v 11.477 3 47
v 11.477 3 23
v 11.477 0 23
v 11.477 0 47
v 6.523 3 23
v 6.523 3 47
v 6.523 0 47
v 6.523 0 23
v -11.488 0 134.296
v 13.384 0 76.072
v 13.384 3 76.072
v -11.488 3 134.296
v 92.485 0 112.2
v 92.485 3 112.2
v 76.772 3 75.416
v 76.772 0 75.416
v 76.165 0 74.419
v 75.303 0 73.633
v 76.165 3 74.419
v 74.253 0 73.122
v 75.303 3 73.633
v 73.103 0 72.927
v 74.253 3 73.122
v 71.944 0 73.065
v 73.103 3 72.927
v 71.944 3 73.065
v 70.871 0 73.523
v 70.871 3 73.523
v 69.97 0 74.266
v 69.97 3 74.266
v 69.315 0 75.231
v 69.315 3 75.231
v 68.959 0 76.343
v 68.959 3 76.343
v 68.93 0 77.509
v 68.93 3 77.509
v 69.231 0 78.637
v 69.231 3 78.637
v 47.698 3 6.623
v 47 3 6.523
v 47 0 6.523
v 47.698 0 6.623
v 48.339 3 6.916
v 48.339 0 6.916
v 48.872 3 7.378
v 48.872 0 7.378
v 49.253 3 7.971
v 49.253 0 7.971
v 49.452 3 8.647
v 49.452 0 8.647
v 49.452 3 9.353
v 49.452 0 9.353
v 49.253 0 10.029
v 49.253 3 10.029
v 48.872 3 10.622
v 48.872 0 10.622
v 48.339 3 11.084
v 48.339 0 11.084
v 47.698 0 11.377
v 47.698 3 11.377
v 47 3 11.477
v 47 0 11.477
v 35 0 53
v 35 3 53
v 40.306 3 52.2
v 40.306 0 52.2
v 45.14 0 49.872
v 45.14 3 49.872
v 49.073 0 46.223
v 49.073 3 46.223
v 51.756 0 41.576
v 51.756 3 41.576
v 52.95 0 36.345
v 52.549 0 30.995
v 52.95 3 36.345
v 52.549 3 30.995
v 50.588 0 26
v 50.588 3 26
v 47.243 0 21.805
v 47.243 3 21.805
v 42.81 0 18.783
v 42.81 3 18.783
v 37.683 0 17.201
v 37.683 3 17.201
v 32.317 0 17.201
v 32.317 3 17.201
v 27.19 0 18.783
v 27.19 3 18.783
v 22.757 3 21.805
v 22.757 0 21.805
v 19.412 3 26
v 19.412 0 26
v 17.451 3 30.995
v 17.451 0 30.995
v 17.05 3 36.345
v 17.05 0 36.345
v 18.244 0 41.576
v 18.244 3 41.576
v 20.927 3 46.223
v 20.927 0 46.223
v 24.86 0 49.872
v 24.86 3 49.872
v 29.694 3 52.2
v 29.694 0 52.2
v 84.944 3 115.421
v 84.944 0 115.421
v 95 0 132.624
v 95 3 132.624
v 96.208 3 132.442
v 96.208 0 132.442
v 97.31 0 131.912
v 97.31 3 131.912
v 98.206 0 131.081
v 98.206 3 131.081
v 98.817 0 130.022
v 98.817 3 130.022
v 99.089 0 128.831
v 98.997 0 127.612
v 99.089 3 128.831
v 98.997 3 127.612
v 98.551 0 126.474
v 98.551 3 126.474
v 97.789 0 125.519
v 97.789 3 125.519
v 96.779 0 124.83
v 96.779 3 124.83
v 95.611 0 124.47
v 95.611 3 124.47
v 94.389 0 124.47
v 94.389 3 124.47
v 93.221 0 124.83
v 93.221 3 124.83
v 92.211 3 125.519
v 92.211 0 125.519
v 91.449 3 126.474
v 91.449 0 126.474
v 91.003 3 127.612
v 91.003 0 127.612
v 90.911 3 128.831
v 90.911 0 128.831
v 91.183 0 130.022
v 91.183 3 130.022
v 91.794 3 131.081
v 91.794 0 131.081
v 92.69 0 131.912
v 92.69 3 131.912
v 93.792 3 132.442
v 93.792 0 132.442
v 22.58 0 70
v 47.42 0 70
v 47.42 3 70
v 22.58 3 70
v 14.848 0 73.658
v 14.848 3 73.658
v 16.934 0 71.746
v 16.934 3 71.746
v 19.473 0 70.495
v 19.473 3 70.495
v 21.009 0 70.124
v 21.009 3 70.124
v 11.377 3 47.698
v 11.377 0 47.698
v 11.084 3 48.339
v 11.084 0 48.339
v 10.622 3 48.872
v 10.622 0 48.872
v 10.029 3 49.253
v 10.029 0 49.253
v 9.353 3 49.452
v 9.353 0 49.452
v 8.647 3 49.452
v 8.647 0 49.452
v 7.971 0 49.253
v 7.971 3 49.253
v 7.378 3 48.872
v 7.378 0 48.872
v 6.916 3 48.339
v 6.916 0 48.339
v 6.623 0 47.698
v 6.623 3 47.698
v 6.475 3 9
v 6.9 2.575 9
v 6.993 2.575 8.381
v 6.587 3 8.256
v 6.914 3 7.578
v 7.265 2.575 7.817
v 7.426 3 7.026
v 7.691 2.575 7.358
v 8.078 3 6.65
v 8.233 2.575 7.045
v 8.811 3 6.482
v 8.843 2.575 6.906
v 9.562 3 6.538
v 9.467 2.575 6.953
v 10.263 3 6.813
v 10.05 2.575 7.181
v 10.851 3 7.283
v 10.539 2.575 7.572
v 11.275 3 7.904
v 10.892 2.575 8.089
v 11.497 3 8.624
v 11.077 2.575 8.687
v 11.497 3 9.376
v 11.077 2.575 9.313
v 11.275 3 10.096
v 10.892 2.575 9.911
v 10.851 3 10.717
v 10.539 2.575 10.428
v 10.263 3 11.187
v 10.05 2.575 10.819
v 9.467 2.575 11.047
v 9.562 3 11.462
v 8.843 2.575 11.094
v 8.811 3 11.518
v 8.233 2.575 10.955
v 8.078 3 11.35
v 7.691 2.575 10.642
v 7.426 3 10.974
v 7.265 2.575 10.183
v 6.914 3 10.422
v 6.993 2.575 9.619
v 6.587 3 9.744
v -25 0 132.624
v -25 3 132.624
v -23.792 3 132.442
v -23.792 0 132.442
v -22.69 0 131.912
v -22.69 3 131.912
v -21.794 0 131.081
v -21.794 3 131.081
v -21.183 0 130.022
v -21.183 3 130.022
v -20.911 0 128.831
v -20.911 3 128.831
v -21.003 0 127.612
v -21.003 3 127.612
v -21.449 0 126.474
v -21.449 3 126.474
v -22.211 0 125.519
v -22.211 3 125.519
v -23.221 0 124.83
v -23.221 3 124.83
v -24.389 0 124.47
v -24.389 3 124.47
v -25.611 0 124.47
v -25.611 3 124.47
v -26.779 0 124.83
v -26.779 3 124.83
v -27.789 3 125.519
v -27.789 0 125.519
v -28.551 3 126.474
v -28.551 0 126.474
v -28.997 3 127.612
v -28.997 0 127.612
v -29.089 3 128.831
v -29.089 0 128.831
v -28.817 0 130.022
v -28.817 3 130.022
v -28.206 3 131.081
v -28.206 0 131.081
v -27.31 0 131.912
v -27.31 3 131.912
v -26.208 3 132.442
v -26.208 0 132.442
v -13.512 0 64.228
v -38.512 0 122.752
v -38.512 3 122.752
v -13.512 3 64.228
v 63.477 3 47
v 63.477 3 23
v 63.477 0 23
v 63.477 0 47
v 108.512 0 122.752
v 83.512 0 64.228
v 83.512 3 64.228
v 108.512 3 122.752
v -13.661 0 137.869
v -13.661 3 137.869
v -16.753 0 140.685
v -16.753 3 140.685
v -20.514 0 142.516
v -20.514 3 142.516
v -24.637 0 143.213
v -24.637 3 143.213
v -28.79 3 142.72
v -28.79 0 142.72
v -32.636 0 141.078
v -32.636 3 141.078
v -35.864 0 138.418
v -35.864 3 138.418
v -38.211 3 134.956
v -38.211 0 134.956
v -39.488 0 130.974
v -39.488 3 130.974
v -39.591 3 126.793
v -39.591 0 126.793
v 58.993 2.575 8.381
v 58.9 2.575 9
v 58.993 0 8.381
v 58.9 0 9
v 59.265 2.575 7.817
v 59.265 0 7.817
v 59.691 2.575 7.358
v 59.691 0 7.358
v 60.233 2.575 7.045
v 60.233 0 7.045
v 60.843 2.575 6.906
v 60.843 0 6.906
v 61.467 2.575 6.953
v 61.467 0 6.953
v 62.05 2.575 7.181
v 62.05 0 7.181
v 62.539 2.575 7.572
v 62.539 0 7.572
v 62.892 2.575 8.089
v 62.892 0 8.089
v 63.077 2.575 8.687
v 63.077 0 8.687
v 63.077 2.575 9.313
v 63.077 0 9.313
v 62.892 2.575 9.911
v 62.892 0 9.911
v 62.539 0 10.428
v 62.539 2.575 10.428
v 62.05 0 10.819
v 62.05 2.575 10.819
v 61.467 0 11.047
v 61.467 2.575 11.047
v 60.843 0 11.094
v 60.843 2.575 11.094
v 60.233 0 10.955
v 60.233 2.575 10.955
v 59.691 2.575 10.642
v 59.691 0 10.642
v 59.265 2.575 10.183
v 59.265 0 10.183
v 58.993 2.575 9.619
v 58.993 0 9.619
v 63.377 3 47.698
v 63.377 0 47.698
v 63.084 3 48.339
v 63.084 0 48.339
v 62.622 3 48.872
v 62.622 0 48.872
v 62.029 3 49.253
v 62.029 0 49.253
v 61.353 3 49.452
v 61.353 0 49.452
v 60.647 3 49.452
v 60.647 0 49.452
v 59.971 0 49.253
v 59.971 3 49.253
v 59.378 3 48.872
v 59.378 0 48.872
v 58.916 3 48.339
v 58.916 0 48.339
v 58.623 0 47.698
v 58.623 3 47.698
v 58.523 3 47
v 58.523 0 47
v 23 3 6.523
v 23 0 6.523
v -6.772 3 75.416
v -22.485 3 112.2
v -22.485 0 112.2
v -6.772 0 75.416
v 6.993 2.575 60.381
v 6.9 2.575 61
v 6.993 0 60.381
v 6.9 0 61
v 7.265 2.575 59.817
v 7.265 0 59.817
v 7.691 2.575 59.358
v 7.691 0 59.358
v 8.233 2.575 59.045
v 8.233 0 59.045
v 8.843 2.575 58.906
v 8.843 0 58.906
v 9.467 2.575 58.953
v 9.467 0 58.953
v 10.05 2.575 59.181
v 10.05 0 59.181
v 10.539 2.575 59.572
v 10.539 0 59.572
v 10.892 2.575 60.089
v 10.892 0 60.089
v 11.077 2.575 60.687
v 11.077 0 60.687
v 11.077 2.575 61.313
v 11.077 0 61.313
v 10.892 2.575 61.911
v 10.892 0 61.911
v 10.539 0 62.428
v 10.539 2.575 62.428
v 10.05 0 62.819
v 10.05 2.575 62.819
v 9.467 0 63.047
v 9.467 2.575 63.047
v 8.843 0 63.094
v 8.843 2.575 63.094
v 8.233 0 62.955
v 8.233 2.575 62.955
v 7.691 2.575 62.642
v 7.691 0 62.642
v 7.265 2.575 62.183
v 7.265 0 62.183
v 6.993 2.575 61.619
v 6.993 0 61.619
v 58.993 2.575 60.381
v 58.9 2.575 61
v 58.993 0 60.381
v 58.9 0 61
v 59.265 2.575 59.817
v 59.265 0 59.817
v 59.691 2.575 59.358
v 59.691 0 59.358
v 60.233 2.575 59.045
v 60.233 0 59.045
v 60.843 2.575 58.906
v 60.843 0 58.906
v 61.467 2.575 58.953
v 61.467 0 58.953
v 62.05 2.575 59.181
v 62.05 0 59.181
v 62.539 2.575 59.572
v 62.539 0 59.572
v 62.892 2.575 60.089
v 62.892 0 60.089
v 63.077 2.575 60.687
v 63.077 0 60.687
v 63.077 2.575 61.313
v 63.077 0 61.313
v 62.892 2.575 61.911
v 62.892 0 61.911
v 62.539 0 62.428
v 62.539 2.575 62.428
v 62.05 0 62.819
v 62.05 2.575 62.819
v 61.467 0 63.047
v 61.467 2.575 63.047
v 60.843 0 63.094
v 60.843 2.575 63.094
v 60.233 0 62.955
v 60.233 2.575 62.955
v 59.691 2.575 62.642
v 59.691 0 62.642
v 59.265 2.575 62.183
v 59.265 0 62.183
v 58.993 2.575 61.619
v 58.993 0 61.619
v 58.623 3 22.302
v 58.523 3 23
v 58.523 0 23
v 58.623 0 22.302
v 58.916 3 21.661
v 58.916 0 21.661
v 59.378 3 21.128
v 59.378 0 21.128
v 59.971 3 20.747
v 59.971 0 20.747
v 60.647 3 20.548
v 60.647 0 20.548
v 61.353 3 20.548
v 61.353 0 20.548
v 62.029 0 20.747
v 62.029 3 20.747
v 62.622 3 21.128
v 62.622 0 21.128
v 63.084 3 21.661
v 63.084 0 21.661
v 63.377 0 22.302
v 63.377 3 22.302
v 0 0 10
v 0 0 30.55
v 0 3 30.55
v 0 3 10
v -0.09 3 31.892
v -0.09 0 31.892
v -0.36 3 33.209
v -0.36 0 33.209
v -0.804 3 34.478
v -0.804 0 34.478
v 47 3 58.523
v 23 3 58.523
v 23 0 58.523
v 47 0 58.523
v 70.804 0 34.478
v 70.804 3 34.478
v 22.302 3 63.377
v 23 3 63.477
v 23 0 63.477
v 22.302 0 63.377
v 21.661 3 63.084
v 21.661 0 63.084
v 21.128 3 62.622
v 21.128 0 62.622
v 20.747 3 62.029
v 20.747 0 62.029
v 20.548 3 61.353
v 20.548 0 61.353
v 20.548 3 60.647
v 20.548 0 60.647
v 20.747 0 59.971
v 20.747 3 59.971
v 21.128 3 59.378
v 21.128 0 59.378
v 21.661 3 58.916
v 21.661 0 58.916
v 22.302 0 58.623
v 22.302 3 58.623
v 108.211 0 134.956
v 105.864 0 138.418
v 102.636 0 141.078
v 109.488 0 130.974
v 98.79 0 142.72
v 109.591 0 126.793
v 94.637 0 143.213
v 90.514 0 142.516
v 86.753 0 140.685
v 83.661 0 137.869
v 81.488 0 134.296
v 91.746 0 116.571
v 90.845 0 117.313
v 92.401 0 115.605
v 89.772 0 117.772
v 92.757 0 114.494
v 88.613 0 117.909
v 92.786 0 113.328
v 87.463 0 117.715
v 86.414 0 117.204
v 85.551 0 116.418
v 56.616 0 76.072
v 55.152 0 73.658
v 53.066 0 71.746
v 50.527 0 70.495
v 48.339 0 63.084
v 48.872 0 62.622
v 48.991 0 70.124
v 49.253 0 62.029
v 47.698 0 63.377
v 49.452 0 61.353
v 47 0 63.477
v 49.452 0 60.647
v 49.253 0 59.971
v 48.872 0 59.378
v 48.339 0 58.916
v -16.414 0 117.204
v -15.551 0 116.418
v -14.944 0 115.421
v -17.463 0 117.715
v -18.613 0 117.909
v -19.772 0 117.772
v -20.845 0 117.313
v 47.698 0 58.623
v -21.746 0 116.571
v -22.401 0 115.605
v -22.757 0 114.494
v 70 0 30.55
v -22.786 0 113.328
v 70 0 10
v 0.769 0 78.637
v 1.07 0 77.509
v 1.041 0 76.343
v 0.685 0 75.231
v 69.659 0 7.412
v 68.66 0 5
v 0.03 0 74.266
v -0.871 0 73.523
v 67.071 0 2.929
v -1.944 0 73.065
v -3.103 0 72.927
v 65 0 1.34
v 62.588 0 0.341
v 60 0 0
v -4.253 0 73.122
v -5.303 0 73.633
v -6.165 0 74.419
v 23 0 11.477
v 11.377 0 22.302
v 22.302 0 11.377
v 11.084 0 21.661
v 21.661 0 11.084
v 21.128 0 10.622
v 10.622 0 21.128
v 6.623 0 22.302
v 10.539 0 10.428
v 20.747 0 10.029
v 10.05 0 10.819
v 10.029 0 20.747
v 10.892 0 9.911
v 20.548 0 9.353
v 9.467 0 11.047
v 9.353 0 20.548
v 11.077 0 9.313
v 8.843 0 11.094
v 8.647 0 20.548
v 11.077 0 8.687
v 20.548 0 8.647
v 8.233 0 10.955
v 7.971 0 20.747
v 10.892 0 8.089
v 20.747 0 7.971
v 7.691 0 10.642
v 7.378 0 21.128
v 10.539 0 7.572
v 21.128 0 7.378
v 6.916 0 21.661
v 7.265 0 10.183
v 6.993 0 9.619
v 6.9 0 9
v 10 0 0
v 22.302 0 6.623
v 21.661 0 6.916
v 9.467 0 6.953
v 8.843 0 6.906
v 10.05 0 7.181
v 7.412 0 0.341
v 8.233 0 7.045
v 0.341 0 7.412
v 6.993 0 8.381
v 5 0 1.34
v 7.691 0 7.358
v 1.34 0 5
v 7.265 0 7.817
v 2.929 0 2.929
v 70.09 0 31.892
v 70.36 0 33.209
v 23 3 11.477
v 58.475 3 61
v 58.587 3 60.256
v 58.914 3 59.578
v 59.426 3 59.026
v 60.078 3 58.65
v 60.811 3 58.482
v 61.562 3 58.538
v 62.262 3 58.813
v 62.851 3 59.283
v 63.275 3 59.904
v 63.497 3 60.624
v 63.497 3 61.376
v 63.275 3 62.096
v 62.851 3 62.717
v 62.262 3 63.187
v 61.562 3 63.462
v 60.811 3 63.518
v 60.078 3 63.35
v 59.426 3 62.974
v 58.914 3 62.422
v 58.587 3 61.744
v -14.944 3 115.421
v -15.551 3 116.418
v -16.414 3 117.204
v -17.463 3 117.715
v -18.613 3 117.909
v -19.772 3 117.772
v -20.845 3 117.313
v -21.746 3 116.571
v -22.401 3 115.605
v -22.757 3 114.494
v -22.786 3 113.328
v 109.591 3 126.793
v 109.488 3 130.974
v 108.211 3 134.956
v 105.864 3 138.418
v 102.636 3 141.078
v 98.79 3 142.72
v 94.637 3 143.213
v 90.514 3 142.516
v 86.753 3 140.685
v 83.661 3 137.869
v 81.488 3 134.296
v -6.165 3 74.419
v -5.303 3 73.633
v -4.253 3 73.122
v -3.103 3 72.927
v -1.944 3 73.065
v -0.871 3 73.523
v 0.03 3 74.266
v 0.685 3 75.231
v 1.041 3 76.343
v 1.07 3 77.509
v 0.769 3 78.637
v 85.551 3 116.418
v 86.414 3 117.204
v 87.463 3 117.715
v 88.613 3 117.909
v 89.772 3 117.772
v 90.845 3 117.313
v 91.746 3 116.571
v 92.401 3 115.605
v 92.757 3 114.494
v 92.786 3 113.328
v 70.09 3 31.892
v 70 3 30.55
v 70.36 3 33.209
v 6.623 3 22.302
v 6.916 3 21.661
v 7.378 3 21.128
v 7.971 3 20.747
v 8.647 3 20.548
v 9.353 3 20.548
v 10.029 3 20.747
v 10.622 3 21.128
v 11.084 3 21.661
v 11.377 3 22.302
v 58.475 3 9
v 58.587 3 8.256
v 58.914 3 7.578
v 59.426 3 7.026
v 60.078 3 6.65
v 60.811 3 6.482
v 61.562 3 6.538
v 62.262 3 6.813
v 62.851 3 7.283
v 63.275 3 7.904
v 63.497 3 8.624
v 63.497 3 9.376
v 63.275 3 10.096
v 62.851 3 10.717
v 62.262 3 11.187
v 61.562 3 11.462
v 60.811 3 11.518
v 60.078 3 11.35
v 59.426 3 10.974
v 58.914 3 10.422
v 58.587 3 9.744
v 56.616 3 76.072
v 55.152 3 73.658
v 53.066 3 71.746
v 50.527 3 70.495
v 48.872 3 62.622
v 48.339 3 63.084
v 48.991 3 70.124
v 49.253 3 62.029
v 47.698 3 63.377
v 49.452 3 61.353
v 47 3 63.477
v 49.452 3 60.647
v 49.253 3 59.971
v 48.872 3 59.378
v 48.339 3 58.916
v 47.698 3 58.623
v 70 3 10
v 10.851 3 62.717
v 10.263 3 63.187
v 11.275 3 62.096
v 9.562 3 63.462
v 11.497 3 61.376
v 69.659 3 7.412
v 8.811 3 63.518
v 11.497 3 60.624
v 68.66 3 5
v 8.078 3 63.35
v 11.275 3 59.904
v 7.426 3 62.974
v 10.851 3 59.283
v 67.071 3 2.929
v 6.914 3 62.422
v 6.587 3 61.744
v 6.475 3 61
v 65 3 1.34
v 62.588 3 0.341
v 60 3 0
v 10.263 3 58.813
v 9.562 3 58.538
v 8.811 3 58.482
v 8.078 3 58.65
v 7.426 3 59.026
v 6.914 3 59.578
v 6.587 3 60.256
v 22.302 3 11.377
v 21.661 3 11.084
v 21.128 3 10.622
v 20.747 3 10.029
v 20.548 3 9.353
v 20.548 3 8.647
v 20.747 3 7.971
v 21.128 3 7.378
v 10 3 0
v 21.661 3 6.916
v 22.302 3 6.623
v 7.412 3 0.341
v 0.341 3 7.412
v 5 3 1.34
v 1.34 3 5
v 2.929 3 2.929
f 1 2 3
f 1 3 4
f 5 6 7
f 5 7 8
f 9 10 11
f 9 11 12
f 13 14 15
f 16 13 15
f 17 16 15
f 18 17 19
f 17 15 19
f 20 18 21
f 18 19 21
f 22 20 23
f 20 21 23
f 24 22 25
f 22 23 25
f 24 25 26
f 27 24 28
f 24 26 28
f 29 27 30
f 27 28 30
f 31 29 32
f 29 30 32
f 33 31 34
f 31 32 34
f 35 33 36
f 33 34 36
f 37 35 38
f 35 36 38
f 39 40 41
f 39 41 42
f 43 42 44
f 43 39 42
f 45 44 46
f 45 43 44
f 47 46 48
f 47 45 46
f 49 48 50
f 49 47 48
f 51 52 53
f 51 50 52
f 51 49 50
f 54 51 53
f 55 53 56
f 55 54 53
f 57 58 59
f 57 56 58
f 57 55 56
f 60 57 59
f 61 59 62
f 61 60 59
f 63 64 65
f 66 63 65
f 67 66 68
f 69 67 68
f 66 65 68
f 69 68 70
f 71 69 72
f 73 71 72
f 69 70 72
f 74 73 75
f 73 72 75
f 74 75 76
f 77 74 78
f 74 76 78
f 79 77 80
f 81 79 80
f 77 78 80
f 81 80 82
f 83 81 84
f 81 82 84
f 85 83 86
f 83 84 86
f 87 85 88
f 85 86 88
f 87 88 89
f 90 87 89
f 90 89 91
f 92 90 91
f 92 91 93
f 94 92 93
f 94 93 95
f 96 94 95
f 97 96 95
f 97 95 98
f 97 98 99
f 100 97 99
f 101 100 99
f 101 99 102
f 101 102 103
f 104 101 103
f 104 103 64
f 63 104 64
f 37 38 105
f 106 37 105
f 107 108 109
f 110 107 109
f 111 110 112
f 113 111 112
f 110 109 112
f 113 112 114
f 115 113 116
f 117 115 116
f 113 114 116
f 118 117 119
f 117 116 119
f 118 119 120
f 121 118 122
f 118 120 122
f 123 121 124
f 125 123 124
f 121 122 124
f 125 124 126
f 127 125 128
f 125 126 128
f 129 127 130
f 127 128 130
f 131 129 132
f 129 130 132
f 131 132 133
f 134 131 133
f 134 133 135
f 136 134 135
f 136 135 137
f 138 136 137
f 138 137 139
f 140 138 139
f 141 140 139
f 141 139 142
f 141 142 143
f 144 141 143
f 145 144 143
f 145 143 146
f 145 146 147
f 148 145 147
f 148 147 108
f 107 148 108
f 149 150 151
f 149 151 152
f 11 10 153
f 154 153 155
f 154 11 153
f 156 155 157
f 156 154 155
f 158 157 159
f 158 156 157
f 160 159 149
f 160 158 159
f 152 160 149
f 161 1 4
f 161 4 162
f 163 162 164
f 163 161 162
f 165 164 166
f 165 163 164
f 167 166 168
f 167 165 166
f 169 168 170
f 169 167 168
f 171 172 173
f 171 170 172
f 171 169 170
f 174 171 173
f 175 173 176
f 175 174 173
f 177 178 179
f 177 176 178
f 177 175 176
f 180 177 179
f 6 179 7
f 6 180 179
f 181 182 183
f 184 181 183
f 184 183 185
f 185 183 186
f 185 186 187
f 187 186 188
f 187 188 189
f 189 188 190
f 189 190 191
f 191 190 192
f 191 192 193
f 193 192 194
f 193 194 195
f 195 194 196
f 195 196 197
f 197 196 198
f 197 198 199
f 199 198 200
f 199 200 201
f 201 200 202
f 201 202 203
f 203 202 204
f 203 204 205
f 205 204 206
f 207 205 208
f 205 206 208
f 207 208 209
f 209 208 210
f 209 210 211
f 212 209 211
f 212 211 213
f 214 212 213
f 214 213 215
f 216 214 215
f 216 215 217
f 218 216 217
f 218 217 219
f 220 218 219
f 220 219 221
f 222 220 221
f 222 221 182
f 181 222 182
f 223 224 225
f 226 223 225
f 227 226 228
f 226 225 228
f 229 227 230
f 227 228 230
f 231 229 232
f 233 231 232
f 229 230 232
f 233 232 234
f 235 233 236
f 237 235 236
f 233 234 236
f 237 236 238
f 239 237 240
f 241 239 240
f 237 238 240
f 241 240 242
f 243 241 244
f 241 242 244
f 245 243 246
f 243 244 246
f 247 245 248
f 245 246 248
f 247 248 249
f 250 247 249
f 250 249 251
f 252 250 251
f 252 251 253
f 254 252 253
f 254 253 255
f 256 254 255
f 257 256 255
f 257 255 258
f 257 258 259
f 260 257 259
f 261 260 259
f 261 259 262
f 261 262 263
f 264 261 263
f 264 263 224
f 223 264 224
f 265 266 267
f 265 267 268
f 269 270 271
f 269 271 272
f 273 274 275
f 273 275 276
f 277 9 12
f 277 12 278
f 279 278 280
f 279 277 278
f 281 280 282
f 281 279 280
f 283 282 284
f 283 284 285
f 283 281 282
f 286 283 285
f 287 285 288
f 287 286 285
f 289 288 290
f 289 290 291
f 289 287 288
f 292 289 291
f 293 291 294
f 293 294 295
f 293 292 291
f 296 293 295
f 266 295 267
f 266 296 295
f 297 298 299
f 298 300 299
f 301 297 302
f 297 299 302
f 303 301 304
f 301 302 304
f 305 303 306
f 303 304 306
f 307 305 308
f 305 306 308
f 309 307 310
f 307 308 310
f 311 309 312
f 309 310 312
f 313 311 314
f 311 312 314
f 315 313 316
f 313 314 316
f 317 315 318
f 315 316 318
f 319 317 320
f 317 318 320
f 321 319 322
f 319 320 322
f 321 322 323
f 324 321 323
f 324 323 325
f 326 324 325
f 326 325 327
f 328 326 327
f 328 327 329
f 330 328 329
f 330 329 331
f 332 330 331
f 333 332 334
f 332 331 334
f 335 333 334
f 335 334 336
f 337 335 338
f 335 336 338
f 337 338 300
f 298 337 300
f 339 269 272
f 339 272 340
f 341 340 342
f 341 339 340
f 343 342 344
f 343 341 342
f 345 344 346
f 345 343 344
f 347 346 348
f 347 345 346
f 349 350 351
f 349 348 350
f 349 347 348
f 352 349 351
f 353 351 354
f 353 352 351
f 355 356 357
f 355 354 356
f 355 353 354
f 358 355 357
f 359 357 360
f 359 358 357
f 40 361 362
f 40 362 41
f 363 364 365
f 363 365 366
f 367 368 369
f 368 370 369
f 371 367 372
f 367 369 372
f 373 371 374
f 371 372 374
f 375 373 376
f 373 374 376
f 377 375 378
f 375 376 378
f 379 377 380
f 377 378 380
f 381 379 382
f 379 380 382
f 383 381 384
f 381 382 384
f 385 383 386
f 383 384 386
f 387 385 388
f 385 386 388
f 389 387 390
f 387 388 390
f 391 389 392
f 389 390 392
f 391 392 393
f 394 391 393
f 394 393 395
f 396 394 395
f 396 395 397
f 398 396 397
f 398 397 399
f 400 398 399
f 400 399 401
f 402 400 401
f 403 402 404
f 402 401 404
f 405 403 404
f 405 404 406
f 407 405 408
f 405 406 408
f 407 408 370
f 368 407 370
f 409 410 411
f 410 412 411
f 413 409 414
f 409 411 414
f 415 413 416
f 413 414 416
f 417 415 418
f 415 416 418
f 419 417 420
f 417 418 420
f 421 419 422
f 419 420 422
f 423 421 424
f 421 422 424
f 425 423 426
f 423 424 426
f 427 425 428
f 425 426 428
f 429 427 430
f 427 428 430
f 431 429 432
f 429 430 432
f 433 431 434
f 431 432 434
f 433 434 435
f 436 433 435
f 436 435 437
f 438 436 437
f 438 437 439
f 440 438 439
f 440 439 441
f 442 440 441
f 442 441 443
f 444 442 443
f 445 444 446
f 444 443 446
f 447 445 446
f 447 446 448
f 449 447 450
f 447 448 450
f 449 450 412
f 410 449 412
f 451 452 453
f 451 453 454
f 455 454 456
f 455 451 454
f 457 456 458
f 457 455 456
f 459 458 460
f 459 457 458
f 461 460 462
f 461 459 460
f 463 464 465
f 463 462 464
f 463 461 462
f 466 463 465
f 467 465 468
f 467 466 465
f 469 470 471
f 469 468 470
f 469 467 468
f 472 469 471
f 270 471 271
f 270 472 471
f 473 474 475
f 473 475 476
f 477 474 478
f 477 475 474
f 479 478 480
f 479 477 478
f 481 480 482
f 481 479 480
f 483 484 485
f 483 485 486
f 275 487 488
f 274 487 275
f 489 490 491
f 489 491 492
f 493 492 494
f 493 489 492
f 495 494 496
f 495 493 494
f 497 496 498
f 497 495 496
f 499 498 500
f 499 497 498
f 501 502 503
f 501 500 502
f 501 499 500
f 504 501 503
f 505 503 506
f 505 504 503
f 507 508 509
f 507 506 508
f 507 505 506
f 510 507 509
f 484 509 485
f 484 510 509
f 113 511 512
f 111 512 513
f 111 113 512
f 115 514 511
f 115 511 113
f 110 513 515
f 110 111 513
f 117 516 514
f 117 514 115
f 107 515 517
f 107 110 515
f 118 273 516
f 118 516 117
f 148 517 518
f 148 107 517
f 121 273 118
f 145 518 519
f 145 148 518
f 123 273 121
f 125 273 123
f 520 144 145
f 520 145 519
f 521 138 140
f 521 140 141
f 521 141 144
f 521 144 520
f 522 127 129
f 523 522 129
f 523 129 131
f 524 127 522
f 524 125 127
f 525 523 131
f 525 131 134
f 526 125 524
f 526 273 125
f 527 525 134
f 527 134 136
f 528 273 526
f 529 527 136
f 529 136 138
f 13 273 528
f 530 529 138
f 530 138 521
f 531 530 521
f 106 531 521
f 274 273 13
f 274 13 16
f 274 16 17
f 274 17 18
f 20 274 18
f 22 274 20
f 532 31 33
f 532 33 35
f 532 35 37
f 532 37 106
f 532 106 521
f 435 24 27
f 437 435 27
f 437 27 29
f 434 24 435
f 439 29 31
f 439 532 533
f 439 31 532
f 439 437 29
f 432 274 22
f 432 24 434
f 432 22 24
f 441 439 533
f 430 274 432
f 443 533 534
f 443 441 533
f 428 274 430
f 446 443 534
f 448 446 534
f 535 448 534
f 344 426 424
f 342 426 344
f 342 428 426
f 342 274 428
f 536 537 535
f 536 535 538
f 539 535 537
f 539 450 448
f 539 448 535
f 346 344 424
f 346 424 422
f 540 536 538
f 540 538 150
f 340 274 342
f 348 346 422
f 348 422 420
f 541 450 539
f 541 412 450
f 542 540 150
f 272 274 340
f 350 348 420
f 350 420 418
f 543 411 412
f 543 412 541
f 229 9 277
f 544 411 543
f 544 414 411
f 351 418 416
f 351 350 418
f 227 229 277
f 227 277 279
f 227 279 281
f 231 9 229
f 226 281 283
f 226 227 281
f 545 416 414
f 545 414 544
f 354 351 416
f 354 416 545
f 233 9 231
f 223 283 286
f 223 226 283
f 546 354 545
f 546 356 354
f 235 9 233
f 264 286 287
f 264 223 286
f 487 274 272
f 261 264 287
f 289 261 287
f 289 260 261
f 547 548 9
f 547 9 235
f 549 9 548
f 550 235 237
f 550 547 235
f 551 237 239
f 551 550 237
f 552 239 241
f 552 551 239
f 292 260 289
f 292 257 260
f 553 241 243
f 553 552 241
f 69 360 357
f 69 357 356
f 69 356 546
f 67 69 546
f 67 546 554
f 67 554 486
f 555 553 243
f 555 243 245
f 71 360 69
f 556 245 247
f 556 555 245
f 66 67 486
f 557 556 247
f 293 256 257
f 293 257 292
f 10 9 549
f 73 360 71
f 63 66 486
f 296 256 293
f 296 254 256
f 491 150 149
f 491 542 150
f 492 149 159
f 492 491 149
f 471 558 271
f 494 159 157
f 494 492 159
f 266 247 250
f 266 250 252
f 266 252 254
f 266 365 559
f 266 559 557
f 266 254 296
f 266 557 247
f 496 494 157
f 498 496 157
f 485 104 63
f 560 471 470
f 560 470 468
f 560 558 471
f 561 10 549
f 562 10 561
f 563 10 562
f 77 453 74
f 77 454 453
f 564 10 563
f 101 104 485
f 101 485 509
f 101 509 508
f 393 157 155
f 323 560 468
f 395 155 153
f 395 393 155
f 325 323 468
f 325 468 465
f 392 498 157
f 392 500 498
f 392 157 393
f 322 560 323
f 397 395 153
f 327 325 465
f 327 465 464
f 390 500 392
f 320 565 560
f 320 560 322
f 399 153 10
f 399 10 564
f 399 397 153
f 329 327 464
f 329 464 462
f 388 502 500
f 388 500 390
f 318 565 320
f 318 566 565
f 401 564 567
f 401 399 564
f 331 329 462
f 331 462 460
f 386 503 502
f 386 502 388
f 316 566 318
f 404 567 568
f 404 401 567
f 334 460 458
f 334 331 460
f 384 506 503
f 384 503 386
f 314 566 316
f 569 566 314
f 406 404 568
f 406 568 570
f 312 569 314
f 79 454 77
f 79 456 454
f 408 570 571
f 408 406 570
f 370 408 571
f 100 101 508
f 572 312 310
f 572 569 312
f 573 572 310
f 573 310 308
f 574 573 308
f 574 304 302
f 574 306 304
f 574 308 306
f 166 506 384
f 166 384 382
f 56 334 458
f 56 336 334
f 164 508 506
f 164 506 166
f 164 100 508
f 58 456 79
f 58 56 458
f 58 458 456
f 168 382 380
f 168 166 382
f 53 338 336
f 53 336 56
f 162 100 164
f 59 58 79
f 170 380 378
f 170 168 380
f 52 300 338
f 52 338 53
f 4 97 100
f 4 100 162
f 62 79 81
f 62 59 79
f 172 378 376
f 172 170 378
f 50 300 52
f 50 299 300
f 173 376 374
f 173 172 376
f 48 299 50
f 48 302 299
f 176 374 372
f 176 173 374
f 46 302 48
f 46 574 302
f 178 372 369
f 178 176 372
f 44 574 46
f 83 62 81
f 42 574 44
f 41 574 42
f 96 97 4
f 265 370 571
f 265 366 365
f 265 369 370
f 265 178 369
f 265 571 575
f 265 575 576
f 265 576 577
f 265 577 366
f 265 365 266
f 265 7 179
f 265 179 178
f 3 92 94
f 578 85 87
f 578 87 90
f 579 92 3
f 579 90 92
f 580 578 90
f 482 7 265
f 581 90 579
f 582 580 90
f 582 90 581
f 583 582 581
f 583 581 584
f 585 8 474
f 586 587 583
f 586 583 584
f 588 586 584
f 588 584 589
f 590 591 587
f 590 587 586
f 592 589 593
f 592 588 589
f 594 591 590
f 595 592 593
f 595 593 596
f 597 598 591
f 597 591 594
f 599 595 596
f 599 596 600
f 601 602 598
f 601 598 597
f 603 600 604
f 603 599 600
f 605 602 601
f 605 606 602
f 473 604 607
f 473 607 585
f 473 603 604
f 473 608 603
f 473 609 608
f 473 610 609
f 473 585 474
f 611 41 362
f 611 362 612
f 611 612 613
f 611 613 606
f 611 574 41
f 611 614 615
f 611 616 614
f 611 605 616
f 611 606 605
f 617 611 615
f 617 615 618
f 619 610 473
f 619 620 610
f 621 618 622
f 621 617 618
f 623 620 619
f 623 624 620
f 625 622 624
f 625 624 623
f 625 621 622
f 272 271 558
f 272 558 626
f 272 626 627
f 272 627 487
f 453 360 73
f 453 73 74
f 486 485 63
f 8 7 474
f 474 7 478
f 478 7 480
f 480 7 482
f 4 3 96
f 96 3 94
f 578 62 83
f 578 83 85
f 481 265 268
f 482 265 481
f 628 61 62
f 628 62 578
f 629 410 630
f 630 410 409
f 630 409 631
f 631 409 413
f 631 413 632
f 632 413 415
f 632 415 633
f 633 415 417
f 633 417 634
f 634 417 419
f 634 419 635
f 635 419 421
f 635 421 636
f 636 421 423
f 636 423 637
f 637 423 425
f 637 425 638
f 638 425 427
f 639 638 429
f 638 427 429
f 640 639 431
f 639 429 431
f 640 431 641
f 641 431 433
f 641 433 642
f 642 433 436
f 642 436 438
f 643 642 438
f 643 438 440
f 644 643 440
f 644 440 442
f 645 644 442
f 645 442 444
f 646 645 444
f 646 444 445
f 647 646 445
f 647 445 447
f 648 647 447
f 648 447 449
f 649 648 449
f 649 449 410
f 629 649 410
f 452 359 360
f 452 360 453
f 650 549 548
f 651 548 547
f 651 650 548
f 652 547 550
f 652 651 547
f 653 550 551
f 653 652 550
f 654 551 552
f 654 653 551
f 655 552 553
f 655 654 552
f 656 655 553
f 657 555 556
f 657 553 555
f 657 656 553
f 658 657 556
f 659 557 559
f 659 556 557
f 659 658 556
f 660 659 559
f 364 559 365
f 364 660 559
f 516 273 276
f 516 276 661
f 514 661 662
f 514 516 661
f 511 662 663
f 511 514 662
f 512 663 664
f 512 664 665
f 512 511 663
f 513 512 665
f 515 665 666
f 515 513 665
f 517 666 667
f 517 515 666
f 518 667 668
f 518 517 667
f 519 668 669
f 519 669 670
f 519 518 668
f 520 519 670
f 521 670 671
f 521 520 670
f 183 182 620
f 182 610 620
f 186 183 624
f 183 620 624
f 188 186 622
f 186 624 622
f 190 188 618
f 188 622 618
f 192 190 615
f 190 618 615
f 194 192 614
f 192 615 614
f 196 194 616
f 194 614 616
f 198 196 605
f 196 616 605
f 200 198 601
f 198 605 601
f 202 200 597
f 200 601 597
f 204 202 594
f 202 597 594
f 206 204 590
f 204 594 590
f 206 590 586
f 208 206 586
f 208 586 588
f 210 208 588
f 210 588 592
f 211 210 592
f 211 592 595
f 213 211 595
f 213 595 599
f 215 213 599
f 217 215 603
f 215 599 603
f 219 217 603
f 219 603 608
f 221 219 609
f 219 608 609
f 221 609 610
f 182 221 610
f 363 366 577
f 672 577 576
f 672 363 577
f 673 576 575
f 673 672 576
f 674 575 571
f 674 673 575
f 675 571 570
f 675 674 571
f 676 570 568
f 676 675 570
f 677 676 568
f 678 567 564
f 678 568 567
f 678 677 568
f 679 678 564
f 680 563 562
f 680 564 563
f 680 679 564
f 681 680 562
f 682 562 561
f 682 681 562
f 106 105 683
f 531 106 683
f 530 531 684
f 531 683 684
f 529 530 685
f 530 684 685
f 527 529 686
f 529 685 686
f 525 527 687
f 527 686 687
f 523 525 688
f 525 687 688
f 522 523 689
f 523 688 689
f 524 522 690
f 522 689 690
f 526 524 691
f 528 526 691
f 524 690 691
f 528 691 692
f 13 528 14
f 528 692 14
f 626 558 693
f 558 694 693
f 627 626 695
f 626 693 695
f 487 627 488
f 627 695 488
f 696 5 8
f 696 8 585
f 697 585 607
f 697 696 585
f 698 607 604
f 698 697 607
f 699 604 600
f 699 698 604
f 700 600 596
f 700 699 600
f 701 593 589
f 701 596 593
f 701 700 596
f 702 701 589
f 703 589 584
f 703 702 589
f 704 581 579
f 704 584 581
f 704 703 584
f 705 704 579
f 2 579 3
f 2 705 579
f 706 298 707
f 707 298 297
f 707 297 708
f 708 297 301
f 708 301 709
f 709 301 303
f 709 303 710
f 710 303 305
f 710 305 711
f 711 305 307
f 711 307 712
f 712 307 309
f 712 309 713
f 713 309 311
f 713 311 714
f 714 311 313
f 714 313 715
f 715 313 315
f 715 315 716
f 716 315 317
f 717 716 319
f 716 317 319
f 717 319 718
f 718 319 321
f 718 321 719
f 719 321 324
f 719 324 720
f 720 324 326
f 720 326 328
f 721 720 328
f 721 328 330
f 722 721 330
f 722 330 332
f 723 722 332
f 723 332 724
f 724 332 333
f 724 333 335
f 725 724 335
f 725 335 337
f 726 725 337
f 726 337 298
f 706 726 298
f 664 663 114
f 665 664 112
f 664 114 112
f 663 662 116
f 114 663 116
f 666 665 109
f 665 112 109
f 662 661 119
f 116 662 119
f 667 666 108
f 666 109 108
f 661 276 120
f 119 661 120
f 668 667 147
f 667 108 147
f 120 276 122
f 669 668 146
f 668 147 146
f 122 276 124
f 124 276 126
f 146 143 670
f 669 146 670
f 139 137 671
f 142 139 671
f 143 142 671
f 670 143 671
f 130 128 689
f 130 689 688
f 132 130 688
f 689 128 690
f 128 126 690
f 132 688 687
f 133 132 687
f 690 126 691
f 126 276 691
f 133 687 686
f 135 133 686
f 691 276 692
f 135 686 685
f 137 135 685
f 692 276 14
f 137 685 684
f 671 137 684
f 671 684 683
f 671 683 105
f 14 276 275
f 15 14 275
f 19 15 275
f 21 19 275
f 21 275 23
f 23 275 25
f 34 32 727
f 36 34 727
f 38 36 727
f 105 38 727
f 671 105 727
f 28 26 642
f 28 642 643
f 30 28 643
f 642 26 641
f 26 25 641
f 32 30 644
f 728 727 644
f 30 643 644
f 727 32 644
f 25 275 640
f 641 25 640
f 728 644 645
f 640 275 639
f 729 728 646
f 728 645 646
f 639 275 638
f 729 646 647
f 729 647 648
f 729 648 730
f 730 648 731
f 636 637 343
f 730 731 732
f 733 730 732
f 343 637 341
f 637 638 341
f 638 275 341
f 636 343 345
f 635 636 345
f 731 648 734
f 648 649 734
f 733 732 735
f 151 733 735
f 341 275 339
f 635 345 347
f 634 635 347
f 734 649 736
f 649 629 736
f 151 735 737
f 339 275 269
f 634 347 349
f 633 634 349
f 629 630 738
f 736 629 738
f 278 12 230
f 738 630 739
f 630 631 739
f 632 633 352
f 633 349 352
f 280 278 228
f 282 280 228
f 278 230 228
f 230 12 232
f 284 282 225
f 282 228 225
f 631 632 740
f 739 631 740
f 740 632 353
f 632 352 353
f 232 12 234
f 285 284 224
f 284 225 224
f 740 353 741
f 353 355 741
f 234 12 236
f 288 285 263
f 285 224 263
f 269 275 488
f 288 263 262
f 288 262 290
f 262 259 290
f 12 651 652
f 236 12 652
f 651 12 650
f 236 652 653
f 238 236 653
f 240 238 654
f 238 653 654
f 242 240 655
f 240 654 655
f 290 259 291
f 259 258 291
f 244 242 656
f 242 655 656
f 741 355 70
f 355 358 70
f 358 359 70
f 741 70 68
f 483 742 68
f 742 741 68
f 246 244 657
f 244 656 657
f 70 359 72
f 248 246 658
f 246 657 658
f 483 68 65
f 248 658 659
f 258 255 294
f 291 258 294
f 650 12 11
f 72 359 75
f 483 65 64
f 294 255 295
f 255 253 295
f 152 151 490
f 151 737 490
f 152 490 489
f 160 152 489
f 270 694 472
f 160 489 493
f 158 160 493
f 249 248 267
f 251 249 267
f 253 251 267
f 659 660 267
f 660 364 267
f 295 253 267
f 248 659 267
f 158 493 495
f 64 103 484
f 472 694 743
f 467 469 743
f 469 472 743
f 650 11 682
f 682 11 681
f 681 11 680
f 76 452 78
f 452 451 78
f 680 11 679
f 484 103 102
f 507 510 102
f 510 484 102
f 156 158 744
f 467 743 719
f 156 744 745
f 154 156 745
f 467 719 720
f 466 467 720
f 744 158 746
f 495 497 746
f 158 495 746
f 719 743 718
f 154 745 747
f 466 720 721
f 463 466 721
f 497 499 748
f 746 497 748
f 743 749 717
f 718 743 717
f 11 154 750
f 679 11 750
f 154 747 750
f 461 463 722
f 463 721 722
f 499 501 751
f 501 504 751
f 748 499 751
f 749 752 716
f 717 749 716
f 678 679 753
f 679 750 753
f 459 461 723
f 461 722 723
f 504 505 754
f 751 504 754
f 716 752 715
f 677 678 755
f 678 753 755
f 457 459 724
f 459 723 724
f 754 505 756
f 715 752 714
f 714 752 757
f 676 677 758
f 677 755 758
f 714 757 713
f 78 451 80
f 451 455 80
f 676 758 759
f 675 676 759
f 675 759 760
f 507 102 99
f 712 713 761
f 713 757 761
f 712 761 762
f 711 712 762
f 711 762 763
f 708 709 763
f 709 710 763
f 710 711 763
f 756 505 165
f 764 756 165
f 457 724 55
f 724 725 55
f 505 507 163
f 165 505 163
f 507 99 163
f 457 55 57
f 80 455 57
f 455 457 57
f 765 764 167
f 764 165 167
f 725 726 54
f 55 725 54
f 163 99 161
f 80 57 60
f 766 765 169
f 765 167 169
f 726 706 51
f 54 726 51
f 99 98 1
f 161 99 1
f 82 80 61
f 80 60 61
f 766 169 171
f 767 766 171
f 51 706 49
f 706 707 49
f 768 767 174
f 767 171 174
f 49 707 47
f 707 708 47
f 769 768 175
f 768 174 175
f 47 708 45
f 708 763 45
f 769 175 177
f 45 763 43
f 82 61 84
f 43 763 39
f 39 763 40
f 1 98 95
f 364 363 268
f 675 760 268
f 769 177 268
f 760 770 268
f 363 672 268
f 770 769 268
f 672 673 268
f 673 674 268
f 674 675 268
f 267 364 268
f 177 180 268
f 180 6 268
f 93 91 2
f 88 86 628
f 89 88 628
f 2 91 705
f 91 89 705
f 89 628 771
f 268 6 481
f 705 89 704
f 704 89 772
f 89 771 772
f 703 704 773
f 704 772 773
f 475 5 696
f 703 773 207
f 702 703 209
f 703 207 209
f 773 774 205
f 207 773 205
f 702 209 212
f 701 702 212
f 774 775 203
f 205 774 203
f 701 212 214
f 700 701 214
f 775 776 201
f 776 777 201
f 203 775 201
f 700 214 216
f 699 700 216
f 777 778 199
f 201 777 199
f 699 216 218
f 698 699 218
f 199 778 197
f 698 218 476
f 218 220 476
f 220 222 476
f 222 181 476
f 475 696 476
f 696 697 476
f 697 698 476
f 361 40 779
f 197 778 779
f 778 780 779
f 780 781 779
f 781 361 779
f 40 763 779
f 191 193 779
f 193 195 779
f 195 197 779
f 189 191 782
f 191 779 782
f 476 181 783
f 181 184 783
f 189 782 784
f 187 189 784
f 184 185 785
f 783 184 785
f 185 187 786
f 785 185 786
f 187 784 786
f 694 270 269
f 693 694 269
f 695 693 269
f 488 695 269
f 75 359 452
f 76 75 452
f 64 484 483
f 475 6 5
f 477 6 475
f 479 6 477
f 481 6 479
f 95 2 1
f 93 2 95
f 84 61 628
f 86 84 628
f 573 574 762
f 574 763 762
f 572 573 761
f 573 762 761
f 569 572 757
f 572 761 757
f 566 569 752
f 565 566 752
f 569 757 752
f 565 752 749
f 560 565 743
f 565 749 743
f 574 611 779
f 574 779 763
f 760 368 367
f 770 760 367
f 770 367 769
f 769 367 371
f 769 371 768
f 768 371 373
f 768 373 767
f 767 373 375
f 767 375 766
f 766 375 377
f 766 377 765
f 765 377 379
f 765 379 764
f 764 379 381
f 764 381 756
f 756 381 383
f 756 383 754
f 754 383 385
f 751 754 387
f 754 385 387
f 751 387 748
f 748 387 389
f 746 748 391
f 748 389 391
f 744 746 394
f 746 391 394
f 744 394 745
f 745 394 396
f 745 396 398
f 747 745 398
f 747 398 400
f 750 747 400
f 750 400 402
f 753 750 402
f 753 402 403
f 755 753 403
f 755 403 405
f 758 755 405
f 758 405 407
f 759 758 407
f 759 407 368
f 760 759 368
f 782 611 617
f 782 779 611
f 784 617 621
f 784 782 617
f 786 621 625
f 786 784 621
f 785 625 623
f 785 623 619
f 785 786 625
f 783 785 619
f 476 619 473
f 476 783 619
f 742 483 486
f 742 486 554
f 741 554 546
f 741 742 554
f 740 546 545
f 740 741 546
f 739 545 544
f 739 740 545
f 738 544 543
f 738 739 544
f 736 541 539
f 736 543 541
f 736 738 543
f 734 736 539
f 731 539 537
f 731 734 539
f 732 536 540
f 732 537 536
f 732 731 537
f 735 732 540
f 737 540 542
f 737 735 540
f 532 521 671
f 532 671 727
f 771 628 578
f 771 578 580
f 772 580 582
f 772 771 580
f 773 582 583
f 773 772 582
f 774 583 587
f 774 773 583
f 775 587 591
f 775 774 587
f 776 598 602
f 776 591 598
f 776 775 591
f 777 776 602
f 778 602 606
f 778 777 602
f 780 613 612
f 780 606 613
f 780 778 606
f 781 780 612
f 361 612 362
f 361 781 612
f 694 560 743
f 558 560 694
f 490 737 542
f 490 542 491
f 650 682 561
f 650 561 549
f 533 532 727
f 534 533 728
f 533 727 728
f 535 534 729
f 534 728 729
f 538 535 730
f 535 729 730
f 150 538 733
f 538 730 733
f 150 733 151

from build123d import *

# Parameters (mm, degrees)
EXTRUDE_1_DEPTH              = 3
HOLE_WIZARD_M5_1_D           = 4.2
HOLE_WIZARD_M5_1_CSINK_D     = 5.05
HOLE_WIZARD_M5_1_CSINK_ANGLE = 90
CUT_EXTRUDE_1_REACH          = 182.424
SKETCH_4_R                   = 4.1
FILLET_1_R                   = 10
CUT_EXTRUDE_2_REACH          = 182.424
SKETCH_5_R                   = 18
CUT_EXTRUDE_3_REACH          = 182.424


with BuildPart() as part:
    # 草图1 → 凸台-拉伸1 (new body)
    with BuildSketch(Plane(origin=(0, 0, 0), x_dir=(1, 0, 0), z_dir=(0, 1, 0))):
        with BuildLine():
            Line((0, 0), (70, 0))
            Line((70, 0), (70, -32.596529214))
            Line((70, -32.596529214), (83.512088558, -64.228012072))
            Line((83.512088558, -64.228012072), (108.512088558, -122.752426568))
            ThreePointArc((108.512088558, -122.752426568), (100.771987928, -142.036503054), (81.487911442, -134.296402424))
            Line((81.487911442, -134.296402424), (56.487911442, -75.771987928))
            Line((56.487911442, -75.771987928), (54.022278946, -70))
            Line((54.022278946, -70), (15.977721054, -70))
            Line((15.977721054, -70), (13.512088558, -75.771987928))
            Line((13.512088558, -75.771987928), (-11.487911442, -134.296402424))
            ThreePointArc((-11.487911442, -134.296402424), (-30.771987928, -142.036503054), (-38.512088558, -122.752426568))
            Line((-38.512088558, -122.752426568), (-13.512088558, -64.228012072))
            Line((-13.512088558, -64.228012072), (0, -32.596529214))
            Line((0, -32.596529214), (0, 0))
        make_face()
    extrude(amount=EXTRUDE_1_DEPTH)

    # M5 螺纹孔1 (through all)
    with Locations(Plane(origin=(0, 3, 0), x_dir=(1, 0, 0), z_dir=(0, 1, 0))):
        with Locations((9, -61), (61, -9), (9, -9), (61, -61)):
            CounterSinkHole(HOLE_WIZARD_M5_1_D / 2, HOLE_WIZARD_M5_1_CSINK_D / 2, counter_sink_angle=HOLE_WIZARD_M5_1_CSINK_ANGLE)

    # 草图4 → 切除-拉伸1 (cut, up to next)
    with BuildSketch(Plane(origin=(0, 3, 0), x_dir=(1, 0, 0), z_dir=(0, 1, 0)), mode=Mode.PRIVATE) as cut_extrude_1_sk1:
        with Locations(Location((-25, -128.524414496, 0), (0, 0, 270))):
            Circle(SKETCH_4_R)
    cut_extrude_1_tool1 = extrude(cut_extrude_1_sk1.sketch, amount=-CUT_EXTRUDE_1_REACH, mode=Mode.PRIVATE) & part.part
    # 草图4 → 切除-拉伸1 (cut, up to next)
    with BuildSketch(Plane(origin=(0, 3, 0), x_dir=(1, 0, 0), z_dir=(0, 1, 0)), mode=Mode.PRIVATE) as cut_extrude_1_sk2:
        with Locations(Location((95, -128.524414496, 0), (0, 0, 270))):
            Circle(SKETCH_4_R)
    cut_extrude_1_tool2 = extrude(cut_extrude_1_sk2.sketch, amount=-CUT_EXTRUDE_1_REACH, mode=Mode.PRIVATE) & part.part
    add(cut_extrude_1_tool1.solids().sort_by_distance((-25, 3, 128.524414))[0], mode=Mode.SUBTRACT)
    add(cut_extrude_1_tool2.solids().sort_by_distance((95, 3, 128.524414))[0], mode=Mode.SUBTRACT)

    # 圆角1
    fillet_1_edges = [part.edges().sort_by_distance(p)[0] for p in [
        (0, 1.5, 0),
        (70, 1.5, 0),
        (70, 1.5, 32.596529214),
        (54.022278946, 1.5, 70),
        (15.977721054, 1.5, 70),
        (0, 1.5, 32.596529214),
    ]]
    fillet(fillet_1_edges, radius=FILLET_1_R)

    # 草图5 → 切除-拉伸2 (cut, up to next)
    with BuildSketch(Plane(origin=(0, 3, 0), x_dir=(1, 0, 0), z_dir=(0, 1, 0)), mode=Mode.PRIVATE) as cut_extrude_2_sk1:
        with Locations(Location((35, -35, 0), (0, 0, 270))):
            Circle(SKETCH_5_R)
    cut_extrude_2_tool1 = extrude(cut_extrude_2_sk1.sketch, amount=-CUT_EXTRUDE_2_REACH, mode=Mode.PRIVATE) & part.part
    add(cut_extrude_2_tool1.solids().sort_by_distance((35, 3, 35))[0], mode=Mode.SUBTRACT)

    # 草图6 → 切除-拉伸3 (cut, up to next)
    with BuildSketch(Plane(origin=(0, 3, 0), x_dir=(1, 0, 0), z_dir=(0, 1, 0)), mode=Mode.PRIVATE) as cut_extrude_3_sk1:
        with BuildLine():
            Line((-22.485091694, -112.200038973), (-6.771815415, -75.415627212))
            ThreePointArc((-6.771815415, -75.415627212), (-1.390802391, -73.255835825), (0.768988996, -78.636848849))
            Line((0.768988996, -78.636848849), (-14.944287283, -115.42126061))
            ThreePointArc((-14.944287283, -115.42126061), (-20.325300307, -117.581051997), (-22.485091694, -112.200038973))
        make_face()
    cut_extrude_3_tool1 = extrude(cut_extrude_3_sk1.sketch, amount=-CUT_EXTRUDE_3_REACH, mode=Mode.PRIVATE) & part.part
    # 草图6 → 切除-拉伸3 (cut, up to next)
    with BuildSketch(Plane(origin=(0, 3, 0), x_dir=(1, 0, 0), z_dir=(0, 1, 0)), mode=Mode.PRIVATE) as cut_extrude_3_sk2:
        with BuildLine():
            Line((92.485091694, -112.200038973), (76.771815415, -75.415627212))
            ThreePointArc((76.771815415, -75.415627212), (71.390802391, -73.255835825), (69.231011004, -78.636848849))
            Line((69.231011004, -78.636848849), (84.944287283, -115.42126061))
            ThreePointArc((84.944287283, -115.42126061), (90.325300307, -117.581051997), (92.485091694, -112.200038973))
        make_face()
    cut_extrude_3_tool2 = extrude(cut_extrude_3_sk2.sketch, amount=-CUT_EXTRUDE_3_REACH, mode=Mode.PRIVATE) & part.part
    # 草图6 → 切除-拉伸3 (cut, up to next)
    with BuildSketch(Plane(origin=(0, 3, 0), x_dir=(1, 0, 0), z_dir=(0, 1, 0)), mode=Mode.PRIVATE) as cut_extrude_3_sk3:
        with BuildLine():
            Line((23, -6.522932736), (47, -6.522932736))
            ThreePointArc((47, -6.522932736), (49.477067264, -9), (47, -11.477067264))
            Line((47, -11.477067264), (23, -11.477067264))
            ThreePointArc((23, -11.477067264), (20.522932736, -9), (23, -6.522932736))
        make_face()
    cut_extrude_3_tool3 = extrude(cut_extrude_3_sk3.sketch, amount=-CUT_EXTRUDE_3_REACH, mode=Mode.PRIVATE) & part.part
    # 草图6 → 切除-拉伸3 (cut, up to next)
    with BuildSketch(Plane(origin=(0, 3, 0), x_dir=(1, 0, 0), z_dir=(0, 1, 0)), mode=Mode.PRIVATE) as cut_extrude_3_sk4:
        with BuildLine():
            Line((63.477067264, -23), (63.477067264, -47))
            ThreePointArc((63.477067264, -47), (61, -49.477067264), (58.522932736, -47))
            Line((58.522932736, -47), (58.522932736, -23))
            ThreePointArc((58.522932736, -23), (61, -20.522932736), (63.477067264, -23))
        make_face()
    cut_extrude_3_tool4 = extrude(cut_extrude_3_sk4.sketch, amount=-CUT_EXTRUDE_3_REACH, mode=Mode.PRIVATE) & part.part
    # 草图6 → 切除-拉伸3 (cut, up to next)
    with BuildSketch(Plane(origin=(0, 3, 0), x_dir=(1, 0, 0), z_dir=(0, 1, 0)), mode=Mode.PRIVATE) as cut_extrude_3_sk5:
        with BuildLine():
            Line((47, -63.477067264), (23, -63.477067264))
            ThreePointArc((23, -63.477067264), (20.522932736, -61), (23, -58.522932736))
            Line((23, -58.522932736), (47, -58.522932736))
            ThreePointArc((47, -58.522932736), (49.477067264, -61), (47, -63.477067264))
        make_face()
    cut_extrude_3_tool5 = extrude(cut_extrude_3_sk5.sketch, amount=-CUT_EXTRUDE_3_REACH, mode=Mode.PRIVATE) & part.part
    # 草图6 → 切除-拉伸3 (cut, up to next)
    with BuildSketch(Plane(origin=(0, 3, 0), x_dir=(1, 0, 0), z_dir=(0, 1, 0)), mode=Mode.PRIVATE) as cut_extrude_3_sk6:
        with BuildLine():
            Line((6.522932736, -47), (6.522932736, -23))
            ThreePointArc((6.522932736, -23), (9, -20.522932736), (11.477067264, -23))
            Line((11.477067264, -23), (11.477067264, -47))
            ThreePointArc((11.477067264, -47), (9, -49.477067264), (6.522932736, -47))
        make_face()
    cut_extrude_3_tool6 = extrude(cut_extrude_3_sk6.sketch, amount=-CUT_EXTRUDE_3_REACH, mode=Mode.PRIVATE) & part.part
    add(cut_extrude_3_tool1.solids().sort_by_distance((-10.858051, 3, 95.418444))[0], mode=Mode.SUBTRACT)
    add(cut_extrude_3_tool2.solids().sort_by_distance((80.858051, 3, 95.418444))[0], mode=Mode.SUBTRACT)
    add(cut_extrude_3_tool3.solids().sort_by_distance((35, 3, 9))[0], mode=Mode.SUBTRACT)
    add(cut_extrude_3_tool4.solids().sort_by_distance((61, 3, 35))[0], mode=Mode.SUBTRACT)
    add(cut_extrude_3_tool5.solids().sort_by_distance((35, 3, 61))[0], mode=Mode.SUBTRACT)
    add(cut_extrude_3_tool6.solids().sort_by_distance((9, 3, 35))[0], mode=Mode.SUBTRACT)


solid = part.part
